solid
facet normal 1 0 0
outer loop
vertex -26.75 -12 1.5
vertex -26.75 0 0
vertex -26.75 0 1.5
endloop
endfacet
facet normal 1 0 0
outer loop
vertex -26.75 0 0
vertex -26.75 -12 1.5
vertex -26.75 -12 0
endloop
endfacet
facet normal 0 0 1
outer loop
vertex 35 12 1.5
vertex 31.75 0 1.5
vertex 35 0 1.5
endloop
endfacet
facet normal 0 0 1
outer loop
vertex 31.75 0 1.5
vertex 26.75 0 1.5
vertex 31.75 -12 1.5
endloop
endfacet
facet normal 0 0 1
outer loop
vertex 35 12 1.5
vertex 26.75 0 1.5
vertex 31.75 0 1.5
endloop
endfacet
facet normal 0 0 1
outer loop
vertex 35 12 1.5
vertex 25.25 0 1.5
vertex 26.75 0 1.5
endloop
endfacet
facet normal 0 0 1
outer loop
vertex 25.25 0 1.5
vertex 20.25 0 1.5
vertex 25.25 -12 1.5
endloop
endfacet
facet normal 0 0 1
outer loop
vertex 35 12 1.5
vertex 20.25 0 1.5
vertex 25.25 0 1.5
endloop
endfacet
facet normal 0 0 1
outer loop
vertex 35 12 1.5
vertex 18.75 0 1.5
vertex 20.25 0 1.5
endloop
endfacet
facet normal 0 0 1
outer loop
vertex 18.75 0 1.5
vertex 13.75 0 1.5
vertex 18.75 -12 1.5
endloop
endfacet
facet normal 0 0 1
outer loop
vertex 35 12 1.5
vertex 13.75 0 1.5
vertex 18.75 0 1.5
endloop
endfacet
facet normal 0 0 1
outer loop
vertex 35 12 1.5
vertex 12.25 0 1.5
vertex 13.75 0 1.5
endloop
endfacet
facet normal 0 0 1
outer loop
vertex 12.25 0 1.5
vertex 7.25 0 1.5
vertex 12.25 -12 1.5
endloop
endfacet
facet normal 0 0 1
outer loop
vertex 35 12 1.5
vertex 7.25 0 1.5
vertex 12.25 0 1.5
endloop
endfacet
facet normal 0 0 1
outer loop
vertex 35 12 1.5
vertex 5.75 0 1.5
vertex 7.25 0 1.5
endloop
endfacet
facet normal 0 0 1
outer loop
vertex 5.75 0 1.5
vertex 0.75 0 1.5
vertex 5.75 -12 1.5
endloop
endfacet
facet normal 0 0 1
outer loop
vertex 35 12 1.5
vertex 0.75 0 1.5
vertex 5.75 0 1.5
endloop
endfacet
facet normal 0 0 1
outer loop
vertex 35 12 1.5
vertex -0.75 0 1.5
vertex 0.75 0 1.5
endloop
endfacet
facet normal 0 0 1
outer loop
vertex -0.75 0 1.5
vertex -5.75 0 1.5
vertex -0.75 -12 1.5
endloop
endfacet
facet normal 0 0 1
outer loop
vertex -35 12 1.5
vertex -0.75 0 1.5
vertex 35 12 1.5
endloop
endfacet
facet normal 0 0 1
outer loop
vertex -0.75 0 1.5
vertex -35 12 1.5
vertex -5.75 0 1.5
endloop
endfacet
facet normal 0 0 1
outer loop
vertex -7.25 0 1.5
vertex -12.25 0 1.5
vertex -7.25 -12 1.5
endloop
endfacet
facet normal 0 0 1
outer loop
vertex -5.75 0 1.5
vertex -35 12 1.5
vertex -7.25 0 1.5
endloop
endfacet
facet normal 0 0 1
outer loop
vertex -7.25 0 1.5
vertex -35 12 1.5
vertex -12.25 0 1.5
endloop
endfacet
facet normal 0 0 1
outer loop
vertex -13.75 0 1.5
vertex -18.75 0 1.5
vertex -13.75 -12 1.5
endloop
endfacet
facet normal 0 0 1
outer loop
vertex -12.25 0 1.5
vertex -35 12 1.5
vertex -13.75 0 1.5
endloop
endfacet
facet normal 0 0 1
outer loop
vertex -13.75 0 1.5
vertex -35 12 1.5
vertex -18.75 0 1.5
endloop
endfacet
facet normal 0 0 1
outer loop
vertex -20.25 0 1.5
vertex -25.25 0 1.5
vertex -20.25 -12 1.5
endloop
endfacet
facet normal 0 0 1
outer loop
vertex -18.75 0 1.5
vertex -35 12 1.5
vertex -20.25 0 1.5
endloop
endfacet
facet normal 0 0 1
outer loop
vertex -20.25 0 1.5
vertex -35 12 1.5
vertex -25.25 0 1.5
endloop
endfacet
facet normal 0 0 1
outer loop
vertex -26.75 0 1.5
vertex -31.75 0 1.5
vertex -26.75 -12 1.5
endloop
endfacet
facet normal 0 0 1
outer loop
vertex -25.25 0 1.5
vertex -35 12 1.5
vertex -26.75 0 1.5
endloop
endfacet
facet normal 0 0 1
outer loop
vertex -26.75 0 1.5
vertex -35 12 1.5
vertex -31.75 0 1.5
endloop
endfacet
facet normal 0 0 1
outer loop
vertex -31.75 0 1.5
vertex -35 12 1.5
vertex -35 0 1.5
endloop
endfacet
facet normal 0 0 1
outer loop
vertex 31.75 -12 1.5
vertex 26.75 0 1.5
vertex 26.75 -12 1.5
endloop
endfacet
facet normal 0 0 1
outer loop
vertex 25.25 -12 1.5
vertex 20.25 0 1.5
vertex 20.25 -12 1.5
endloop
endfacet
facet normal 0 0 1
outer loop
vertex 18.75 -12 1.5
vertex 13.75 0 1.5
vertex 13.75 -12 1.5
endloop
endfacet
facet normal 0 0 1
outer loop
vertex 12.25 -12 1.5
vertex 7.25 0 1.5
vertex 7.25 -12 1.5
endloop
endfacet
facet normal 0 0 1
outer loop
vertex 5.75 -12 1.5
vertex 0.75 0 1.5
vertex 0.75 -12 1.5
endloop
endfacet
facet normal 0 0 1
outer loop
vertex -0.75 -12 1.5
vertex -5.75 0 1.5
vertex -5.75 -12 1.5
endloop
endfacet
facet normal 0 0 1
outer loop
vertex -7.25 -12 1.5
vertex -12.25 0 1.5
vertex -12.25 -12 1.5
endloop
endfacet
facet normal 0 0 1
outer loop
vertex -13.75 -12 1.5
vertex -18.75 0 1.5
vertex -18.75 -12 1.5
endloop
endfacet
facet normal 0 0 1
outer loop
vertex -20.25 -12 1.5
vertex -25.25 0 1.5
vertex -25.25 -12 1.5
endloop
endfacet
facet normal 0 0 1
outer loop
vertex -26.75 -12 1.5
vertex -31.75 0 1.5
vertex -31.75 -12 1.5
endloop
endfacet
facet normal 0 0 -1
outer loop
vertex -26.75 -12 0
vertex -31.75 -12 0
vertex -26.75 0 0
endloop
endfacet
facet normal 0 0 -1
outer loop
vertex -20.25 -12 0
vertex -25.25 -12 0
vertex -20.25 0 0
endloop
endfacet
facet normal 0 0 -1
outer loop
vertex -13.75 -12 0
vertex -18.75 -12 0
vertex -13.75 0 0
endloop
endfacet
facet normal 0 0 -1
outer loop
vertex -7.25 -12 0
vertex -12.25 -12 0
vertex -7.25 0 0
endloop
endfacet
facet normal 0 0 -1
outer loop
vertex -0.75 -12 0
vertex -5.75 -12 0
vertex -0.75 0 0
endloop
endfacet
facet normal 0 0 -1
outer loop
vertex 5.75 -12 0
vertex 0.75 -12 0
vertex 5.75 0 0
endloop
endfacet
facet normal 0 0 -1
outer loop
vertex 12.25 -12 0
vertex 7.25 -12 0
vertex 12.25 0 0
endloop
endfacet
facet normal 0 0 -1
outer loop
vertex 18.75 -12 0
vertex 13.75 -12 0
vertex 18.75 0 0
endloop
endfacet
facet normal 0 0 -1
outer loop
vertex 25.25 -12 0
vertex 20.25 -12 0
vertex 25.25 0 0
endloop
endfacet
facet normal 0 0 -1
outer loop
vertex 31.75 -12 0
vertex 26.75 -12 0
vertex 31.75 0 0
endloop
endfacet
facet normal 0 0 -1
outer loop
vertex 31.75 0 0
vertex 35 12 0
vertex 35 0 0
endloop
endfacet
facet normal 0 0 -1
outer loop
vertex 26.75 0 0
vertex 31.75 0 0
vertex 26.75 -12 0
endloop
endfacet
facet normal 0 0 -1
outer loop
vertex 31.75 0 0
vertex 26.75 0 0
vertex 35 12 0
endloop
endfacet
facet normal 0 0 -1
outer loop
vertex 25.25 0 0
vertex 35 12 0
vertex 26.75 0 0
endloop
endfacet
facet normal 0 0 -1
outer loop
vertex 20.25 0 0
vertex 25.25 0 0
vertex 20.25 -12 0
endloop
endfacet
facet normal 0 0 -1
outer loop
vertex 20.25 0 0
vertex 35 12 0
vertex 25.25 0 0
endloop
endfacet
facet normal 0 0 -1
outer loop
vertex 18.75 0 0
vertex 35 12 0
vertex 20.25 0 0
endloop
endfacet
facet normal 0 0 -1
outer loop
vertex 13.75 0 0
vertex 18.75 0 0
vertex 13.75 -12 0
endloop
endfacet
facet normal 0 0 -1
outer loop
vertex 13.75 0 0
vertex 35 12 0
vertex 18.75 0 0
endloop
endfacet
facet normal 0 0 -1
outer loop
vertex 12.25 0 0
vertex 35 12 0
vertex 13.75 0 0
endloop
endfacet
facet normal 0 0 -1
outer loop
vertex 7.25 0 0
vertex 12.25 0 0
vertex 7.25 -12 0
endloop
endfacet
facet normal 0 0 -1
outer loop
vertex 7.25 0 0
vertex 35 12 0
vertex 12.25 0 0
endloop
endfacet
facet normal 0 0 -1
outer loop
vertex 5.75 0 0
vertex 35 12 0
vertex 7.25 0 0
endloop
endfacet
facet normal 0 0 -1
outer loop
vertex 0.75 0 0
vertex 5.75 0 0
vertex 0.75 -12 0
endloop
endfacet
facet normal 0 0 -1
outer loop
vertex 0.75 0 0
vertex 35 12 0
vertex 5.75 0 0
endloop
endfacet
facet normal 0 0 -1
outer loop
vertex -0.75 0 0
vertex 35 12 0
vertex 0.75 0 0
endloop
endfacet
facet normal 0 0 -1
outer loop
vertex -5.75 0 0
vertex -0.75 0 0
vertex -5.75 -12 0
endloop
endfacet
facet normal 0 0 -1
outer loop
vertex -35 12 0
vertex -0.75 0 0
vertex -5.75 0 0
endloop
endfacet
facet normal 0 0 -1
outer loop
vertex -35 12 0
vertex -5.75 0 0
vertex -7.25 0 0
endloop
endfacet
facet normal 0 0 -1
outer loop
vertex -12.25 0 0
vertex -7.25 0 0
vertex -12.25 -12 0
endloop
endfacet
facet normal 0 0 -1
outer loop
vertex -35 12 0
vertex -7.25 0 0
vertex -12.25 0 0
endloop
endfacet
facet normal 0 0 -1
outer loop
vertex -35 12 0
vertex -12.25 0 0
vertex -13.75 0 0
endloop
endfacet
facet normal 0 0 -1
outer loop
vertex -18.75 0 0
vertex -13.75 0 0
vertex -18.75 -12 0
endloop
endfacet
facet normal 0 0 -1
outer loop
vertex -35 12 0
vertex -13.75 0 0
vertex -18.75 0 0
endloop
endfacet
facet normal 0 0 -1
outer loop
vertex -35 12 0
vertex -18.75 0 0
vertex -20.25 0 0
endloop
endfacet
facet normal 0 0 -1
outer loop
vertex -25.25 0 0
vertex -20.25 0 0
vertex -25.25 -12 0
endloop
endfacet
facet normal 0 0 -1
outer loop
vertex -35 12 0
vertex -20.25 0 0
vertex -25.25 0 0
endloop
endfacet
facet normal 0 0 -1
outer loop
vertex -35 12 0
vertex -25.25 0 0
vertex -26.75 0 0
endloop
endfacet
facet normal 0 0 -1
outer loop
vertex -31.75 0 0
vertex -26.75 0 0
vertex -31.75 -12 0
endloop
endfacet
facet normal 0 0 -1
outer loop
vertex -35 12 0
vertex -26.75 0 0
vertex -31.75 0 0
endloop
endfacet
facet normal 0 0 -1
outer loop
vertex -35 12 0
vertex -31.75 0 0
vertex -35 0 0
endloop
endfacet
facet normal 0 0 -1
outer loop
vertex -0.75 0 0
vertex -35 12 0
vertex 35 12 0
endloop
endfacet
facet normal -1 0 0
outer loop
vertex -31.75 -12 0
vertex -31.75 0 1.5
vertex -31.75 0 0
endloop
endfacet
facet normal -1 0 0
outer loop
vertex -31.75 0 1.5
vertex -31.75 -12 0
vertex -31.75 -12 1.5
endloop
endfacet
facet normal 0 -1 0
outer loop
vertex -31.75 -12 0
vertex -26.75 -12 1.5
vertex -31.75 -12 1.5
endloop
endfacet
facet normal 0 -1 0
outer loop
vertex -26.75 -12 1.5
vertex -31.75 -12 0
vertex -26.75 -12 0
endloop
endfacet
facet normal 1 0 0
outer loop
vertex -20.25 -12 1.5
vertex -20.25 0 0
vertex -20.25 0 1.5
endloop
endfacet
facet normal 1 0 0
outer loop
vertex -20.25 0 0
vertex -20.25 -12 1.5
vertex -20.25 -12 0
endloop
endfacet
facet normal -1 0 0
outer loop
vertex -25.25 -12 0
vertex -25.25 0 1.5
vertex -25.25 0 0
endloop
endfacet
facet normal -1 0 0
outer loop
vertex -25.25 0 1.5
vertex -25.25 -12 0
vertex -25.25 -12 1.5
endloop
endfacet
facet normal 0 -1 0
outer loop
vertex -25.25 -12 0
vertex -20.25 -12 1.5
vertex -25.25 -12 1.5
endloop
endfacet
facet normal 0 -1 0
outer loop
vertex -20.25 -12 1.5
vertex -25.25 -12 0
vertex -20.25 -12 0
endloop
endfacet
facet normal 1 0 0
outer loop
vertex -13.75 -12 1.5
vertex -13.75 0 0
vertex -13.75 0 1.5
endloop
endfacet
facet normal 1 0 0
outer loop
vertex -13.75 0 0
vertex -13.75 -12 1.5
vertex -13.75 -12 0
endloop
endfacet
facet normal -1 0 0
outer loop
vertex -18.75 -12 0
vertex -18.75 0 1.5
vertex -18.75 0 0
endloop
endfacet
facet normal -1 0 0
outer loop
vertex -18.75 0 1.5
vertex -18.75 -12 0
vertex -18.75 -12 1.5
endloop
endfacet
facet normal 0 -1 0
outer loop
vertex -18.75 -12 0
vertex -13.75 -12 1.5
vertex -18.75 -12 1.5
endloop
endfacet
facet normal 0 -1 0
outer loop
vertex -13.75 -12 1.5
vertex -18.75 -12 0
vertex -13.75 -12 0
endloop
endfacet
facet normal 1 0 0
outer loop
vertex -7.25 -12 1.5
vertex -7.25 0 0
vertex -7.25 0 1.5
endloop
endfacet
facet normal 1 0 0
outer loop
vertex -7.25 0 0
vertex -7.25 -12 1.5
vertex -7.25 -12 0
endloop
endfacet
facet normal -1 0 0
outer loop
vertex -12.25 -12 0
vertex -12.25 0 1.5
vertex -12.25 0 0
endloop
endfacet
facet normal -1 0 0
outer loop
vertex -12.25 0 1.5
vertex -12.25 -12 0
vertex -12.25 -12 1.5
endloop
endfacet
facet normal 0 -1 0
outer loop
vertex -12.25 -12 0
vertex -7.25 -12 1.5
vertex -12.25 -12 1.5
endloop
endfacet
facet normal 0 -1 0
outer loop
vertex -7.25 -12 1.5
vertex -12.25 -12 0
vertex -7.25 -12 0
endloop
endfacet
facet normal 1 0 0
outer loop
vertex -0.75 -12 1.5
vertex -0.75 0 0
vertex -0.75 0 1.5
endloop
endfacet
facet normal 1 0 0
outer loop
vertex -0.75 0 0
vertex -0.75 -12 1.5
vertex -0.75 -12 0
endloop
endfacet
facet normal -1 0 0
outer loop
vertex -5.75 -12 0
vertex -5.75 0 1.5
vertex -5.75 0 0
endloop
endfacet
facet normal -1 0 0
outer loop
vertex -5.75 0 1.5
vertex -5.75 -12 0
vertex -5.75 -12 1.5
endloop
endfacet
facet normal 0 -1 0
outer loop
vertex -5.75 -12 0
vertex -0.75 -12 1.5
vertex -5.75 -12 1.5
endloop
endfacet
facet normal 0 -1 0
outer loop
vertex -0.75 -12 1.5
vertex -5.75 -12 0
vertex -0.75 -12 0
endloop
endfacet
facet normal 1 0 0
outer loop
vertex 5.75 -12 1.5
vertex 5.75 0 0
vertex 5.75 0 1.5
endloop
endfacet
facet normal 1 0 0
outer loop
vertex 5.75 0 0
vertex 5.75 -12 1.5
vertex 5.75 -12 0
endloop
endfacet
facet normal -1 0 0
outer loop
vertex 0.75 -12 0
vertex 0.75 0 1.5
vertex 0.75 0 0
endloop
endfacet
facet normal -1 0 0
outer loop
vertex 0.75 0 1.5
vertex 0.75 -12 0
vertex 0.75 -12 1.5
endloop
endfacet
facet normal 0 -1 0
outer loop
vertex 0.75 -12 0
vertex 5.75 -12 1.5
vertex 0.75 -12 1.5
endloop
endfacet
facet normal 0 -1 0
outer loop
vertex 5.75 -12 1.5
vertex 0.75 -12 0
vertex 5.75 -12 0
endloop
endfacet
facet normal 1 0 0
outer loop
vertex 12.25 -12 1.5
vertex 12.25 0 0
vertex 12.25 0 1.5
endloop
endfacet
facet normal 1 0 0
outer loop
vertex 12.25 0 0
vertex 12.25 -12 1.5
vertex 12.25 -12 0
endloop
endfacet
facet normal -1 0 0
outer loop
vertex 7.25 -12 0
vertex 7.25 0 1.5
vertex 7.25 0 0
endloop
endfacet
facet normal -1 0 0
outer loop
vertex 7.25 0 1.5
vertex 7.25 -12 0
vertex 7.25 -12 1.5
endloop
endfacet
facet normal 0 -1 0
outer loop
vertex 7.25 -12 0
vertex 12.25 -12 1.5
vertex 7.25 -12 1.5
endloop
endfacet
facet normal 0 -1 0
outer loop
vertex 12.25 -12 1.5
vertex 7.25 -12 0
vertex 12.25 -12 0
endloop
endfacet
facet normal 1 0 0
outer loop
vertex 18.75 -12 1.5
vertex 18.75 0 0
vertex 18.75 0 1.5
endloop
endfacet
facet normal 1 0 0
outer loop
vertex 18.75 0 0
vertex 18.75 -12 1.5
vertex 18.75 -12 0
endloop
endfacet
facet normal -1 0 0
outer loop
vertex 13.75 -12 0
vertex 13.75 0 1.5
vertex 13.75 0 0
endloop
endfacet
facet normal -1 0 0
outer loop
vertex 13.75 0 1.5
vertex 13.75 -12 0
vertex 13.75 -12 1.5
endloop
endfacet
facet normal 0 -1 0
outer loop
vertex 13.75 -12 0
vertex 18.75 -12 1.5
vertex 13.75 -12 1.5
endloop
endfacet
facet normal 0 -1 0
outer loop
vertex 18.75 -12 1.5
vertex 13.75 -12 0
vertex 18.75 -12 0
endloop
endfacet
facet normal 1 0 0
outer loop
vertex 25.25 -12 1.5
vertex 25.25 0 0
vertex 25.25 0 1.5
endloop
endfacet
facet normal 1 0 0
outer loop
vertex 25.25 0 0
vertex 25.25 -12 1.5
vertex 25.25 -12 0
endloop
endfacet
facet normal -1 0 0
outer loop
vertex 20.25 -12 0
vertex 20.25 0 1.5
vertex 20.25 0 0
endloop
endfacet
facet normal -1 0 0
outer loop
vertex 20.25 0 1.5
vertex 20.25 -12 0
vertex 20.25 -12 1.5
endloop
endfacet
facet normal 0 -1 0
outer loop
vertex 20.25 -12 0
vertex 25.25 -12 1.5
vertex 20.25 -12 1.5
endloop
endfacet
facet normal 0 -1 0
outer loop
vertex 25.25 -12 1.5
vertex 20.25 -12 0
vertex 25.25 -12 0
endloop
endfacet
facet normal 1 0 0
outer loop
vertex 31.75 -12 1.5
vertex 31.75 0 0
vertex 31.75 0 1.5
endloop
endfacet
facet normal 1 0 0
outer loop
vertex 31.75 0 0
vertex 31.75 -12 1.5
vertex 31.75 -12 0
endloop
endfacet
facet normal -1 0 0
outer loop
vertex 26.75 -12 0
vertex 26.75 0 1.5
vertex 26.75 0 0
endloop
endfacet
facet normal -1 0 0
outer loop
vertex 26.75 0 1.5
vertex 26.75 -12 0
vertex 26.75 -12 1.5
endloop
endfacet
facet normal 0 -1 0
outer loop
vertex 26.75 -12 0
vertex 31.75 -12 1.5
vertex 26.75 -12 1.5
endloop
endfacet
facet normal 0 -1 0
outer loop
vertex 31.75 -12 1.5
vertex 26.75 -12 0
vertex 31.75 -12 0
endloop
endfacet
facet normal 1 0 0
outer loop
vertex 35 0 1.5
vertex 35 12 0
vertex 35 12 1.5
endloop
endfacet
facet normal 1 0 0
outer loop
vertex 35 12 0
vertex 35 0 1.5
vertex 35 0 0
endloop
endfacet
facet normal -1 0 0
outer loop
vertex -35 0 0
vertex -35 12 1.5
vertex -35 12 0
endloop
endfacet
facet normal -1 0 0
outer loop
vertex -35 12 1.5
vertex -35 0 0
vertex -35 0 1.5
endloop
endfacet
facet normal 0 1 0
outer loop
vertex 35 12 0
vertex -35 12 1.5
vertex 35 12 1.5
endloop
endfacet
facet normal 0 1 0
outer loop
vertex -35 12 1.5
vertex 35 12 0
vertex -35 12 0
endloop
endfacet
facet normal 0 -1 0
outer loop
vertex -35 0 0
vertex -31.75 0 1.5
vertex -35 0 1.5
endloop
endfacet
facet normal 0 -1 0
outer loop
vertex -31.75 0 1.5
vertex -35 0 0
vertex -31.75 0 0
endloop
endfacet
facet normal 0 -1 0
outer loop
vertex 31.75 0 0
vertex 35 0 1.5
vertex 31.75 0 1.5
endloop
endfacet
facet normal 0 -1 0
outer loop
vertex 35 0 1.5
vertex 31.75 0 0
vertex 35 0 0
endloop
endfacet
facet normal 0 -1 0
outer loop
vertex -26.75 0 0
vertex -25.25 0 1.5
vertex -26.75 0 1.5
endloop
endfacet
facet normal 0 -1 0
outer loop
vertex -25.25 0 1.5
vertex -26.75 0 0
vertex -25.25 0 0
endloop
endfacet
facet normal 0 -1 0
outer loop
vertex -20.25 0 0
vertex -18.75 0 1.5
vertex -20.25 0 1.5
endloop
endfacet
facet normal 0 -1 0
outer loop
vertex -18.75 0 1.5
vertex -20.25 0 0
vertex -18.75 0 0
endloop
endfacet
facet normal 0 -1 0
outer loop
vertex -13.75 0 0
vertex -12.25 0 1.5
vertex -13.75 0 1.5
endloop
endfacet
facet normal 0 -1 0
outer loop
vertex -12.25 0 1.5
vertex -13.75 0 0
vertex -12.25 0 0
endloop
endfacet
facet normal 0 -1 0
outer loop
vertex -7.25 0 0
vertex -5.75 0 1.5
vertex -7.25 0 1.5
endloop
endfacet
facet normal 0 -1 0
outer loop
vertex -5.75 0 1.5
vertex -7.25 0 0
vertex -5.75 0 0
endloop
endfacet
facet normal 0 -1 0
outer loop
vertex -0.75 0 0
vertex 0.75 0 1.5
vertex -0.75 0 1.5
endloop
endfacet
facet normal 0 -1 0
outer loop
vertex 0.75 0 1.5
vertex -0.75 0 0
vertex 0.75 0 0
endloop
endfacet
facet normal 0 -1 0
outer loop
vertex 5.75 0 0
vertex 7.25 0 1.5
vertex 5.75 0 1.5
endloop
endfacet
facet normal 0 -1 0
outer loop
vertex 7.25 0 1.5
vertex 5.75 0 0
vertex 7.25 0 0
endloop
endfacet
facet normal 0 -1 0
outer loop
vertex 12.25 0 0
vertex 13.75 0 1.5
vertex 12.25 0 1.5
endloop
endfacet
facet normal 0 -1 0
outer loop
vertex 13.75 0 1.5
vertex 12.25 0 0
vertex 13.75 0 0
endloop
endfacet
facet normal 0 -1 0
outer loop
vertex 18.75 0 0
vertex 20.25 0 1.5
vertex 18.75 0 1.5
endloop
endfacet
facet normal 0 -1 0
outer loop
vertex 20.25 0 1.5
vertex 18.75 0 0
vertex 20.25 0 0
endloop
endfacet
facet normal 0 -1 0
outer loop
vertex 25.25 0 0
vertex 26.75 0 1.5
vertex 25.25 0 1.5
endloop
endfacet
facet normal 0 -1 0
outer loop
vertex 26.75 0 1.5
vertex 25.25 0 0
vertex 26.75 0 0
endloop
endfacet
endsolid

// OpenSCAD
// 10-well agarose gel comb - printed flat on the bed
// Units: mm

$fn = 64;

// ---- Parameters ----
plate_t      = 1.5;   // comb thickness (Z)
spine_len    = 70;    // spine length (X)
spine_w      = 12;    // spine width (Y)
n_teeth      = 10;    // number of teeth / wells
tooth_w      = 5.0;   // tooth width (X)
tooth_len    = 12;    // tooth length (Y), hanging in -Y
tooth_gap    = 1.5;   // gap between neighbouring teeth (X)
overlap      = 0.01;  // small overlap so teeth fuse into spine

// ---- Derived ----
row_w     = n_teeth * tooth_w + (n_teeth - 1) * tooth_gap; // total width of tooth row
total_y   = spine_w + tooth_len;                           // overall Y extent
y_min     = -total_y / 2;                                  // centre part in Y
spine_y0  = y_min + tooth_len;                             // spine starts after teeth
tooth_x0  = -row_w / 2;                                    // first tooth left edge
pitch     = tooth_w + tooth_gap;                           // tooth pitch

// ---- Model ----
union() {
    // Spine (back bar)
    translate([-spine_len / 2, spine_y0, 0])
        cube([spine_len, spine_w, plate_t]);

    // Teeth
    for (i = [0 : n_teeth - 1])
        translate([tooth_x0 + i * pitch, y_min, 0])
            cube([tooth_w, tooth_len + overlap, plate_t]);
}
